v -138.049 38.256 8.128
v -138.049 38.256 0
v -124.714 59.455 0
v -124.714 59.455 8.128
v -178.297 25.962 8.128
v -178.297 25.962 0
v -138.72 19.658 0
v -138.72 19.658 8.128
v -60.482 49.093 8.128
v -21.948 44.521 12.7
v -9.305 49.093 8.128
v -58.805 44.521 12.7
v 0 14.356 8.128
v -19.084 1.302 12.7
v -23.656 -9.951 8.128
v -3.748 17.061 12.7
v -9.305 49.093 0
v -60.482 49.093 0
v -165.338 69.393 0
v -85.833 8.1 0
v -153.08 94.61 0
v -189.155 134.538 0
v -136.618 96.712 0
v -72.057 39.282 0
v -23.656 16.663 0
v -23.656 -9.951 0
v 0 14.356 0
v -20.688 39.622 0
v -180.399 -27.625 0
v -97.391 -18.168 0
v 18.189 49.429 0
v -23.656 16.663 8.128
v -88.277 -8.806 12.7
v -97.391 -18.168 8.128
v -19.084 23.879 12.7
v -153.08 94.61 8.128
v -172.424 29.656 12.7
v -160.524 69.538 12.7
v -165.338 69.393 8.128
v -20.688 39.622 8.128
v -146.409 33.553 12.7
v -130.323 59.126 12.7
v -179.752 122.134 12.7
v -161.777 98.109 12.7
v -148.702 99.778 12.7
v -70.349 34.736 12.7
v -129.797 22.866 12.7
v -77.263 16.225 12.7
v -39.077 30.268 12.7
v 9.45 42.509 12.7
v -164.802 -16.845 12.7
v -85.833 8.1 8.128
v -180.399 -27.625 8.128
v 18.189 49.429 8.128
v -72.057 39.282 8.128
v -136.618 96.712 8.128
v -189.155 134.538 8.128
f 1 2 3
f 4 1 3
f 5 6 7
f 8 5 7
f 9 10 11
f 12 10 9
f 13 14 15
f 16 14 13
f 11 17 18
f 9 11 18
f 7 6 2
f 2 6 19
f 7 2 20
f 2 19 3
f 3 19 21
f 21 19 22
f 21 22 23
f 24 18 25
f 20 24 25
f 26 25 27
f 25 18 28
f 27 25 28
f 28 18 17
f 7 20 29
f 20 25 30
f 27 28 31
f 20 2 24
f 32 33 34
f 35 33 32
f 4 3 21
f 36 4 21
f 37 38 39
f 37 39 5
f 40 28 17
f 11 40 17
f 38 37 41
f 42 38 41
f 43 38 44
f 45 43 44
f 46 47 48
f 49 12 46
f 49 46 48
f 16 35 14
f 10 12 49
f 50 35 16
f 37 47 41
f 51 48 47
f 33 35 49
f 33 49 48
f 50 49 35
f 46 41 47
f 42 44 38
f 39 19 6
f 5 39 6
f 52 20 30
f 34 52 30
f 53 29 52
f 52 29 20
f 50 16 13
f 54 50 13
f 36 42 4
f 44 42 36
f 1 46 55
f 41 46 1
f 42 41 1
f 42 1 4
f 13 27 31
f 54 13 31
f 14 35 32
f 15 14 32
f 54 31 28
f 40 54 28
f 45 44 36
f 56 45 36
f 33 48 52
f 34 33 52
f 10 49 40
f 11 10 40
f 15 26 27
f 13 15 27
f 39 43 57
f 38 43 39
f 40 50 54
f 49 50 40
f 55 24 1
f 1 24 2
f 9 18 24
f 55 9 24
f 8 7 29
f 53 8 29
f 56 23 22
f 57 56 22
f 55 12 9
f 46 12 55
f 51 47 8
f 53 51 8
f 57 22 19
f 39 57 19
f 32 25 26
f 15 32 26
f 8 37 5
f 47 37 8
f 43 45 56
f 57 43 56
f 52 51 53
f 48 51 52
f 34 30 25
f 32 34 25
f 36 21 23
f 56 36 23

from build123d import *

# Parameters (mm, degrees)
F1_DEPTH = 12.7
F2_SIZE  = 4.572


# Not quite as in the source:
# - a feature names something its author has since deleted; it is built from what else it names


with BuildPart() as f1:
    # F0 (on Top) → F1 (new body)
    with BuildSketch(Plane.XY):
        Polygon((-138.7197226286, 19.6580234915), (-180.3987026215, -27.6248455048), (-85.8329609036, 8.0999890342), (-97.3909944296, -18.1682743132), (-23.6561261117, 16.663254671), (-23.6561261117, -9.9510056898), (0, 14.3561139703), (18.1893575937, 49.4287200272), (-20.6876713783, 39.6219007671), (-9.3052154407, 49.093272537), (-60.4820251465, 49.093272537), (-72.0571577549, 39.281655103), (-138.0494087934, 38.2558703423), (-124.7141808271, 59.4554506242), (-153.0797034502, 94.610132277), (-136.6182565689, 96.7115908861), (-189.1547888517, 134.5378756523), (-165.3382331133, 69.3925991654), (-178.2972365618, 25.9624067694), align=None)
    extrude(amount=F1_DEPTH)

    # F2
    f2_edges = [f1.edges().sort_by_distance(p)[0] for p in [
        (-162.886523, 115.624733, 12.7),
        (-177.246511, 101.965237, 12.7),
        (-171.817735, 47.677503, 12.7),
        (-158.50848, 22.810215, 12.7),
        (-159.559213, -3.983411, 12.7),
        (-133.115832, -9.762428, 12.7),
        (-91.611978, -5.034143, 12.7),
        (-60.52356, -0.75251, 12.7),
        (-23.656126, 3.356124, 12.7),
        (-11.828063, 2.202554, 12.7),
        (9.094679, 31.892417, 12.7),
        (-1.249157, 44.52531, 12.7),
        (-14.996443, 44.357587, 12.7),
        (-34.89362, 49.093273, 12.7),
        (-66.269591, 44.187464, 12.7),
        (-105.053283, 38.768763, 12.7),
        (-131.381795, 48.85566, 12.7),
        (-138.896942, 77.032791, 12.7),
        (-144.84898, 95.660862, 12.7),
    ]]
    chamfer(f2_edges, length=F2_SIZE)


solid = f1.part
